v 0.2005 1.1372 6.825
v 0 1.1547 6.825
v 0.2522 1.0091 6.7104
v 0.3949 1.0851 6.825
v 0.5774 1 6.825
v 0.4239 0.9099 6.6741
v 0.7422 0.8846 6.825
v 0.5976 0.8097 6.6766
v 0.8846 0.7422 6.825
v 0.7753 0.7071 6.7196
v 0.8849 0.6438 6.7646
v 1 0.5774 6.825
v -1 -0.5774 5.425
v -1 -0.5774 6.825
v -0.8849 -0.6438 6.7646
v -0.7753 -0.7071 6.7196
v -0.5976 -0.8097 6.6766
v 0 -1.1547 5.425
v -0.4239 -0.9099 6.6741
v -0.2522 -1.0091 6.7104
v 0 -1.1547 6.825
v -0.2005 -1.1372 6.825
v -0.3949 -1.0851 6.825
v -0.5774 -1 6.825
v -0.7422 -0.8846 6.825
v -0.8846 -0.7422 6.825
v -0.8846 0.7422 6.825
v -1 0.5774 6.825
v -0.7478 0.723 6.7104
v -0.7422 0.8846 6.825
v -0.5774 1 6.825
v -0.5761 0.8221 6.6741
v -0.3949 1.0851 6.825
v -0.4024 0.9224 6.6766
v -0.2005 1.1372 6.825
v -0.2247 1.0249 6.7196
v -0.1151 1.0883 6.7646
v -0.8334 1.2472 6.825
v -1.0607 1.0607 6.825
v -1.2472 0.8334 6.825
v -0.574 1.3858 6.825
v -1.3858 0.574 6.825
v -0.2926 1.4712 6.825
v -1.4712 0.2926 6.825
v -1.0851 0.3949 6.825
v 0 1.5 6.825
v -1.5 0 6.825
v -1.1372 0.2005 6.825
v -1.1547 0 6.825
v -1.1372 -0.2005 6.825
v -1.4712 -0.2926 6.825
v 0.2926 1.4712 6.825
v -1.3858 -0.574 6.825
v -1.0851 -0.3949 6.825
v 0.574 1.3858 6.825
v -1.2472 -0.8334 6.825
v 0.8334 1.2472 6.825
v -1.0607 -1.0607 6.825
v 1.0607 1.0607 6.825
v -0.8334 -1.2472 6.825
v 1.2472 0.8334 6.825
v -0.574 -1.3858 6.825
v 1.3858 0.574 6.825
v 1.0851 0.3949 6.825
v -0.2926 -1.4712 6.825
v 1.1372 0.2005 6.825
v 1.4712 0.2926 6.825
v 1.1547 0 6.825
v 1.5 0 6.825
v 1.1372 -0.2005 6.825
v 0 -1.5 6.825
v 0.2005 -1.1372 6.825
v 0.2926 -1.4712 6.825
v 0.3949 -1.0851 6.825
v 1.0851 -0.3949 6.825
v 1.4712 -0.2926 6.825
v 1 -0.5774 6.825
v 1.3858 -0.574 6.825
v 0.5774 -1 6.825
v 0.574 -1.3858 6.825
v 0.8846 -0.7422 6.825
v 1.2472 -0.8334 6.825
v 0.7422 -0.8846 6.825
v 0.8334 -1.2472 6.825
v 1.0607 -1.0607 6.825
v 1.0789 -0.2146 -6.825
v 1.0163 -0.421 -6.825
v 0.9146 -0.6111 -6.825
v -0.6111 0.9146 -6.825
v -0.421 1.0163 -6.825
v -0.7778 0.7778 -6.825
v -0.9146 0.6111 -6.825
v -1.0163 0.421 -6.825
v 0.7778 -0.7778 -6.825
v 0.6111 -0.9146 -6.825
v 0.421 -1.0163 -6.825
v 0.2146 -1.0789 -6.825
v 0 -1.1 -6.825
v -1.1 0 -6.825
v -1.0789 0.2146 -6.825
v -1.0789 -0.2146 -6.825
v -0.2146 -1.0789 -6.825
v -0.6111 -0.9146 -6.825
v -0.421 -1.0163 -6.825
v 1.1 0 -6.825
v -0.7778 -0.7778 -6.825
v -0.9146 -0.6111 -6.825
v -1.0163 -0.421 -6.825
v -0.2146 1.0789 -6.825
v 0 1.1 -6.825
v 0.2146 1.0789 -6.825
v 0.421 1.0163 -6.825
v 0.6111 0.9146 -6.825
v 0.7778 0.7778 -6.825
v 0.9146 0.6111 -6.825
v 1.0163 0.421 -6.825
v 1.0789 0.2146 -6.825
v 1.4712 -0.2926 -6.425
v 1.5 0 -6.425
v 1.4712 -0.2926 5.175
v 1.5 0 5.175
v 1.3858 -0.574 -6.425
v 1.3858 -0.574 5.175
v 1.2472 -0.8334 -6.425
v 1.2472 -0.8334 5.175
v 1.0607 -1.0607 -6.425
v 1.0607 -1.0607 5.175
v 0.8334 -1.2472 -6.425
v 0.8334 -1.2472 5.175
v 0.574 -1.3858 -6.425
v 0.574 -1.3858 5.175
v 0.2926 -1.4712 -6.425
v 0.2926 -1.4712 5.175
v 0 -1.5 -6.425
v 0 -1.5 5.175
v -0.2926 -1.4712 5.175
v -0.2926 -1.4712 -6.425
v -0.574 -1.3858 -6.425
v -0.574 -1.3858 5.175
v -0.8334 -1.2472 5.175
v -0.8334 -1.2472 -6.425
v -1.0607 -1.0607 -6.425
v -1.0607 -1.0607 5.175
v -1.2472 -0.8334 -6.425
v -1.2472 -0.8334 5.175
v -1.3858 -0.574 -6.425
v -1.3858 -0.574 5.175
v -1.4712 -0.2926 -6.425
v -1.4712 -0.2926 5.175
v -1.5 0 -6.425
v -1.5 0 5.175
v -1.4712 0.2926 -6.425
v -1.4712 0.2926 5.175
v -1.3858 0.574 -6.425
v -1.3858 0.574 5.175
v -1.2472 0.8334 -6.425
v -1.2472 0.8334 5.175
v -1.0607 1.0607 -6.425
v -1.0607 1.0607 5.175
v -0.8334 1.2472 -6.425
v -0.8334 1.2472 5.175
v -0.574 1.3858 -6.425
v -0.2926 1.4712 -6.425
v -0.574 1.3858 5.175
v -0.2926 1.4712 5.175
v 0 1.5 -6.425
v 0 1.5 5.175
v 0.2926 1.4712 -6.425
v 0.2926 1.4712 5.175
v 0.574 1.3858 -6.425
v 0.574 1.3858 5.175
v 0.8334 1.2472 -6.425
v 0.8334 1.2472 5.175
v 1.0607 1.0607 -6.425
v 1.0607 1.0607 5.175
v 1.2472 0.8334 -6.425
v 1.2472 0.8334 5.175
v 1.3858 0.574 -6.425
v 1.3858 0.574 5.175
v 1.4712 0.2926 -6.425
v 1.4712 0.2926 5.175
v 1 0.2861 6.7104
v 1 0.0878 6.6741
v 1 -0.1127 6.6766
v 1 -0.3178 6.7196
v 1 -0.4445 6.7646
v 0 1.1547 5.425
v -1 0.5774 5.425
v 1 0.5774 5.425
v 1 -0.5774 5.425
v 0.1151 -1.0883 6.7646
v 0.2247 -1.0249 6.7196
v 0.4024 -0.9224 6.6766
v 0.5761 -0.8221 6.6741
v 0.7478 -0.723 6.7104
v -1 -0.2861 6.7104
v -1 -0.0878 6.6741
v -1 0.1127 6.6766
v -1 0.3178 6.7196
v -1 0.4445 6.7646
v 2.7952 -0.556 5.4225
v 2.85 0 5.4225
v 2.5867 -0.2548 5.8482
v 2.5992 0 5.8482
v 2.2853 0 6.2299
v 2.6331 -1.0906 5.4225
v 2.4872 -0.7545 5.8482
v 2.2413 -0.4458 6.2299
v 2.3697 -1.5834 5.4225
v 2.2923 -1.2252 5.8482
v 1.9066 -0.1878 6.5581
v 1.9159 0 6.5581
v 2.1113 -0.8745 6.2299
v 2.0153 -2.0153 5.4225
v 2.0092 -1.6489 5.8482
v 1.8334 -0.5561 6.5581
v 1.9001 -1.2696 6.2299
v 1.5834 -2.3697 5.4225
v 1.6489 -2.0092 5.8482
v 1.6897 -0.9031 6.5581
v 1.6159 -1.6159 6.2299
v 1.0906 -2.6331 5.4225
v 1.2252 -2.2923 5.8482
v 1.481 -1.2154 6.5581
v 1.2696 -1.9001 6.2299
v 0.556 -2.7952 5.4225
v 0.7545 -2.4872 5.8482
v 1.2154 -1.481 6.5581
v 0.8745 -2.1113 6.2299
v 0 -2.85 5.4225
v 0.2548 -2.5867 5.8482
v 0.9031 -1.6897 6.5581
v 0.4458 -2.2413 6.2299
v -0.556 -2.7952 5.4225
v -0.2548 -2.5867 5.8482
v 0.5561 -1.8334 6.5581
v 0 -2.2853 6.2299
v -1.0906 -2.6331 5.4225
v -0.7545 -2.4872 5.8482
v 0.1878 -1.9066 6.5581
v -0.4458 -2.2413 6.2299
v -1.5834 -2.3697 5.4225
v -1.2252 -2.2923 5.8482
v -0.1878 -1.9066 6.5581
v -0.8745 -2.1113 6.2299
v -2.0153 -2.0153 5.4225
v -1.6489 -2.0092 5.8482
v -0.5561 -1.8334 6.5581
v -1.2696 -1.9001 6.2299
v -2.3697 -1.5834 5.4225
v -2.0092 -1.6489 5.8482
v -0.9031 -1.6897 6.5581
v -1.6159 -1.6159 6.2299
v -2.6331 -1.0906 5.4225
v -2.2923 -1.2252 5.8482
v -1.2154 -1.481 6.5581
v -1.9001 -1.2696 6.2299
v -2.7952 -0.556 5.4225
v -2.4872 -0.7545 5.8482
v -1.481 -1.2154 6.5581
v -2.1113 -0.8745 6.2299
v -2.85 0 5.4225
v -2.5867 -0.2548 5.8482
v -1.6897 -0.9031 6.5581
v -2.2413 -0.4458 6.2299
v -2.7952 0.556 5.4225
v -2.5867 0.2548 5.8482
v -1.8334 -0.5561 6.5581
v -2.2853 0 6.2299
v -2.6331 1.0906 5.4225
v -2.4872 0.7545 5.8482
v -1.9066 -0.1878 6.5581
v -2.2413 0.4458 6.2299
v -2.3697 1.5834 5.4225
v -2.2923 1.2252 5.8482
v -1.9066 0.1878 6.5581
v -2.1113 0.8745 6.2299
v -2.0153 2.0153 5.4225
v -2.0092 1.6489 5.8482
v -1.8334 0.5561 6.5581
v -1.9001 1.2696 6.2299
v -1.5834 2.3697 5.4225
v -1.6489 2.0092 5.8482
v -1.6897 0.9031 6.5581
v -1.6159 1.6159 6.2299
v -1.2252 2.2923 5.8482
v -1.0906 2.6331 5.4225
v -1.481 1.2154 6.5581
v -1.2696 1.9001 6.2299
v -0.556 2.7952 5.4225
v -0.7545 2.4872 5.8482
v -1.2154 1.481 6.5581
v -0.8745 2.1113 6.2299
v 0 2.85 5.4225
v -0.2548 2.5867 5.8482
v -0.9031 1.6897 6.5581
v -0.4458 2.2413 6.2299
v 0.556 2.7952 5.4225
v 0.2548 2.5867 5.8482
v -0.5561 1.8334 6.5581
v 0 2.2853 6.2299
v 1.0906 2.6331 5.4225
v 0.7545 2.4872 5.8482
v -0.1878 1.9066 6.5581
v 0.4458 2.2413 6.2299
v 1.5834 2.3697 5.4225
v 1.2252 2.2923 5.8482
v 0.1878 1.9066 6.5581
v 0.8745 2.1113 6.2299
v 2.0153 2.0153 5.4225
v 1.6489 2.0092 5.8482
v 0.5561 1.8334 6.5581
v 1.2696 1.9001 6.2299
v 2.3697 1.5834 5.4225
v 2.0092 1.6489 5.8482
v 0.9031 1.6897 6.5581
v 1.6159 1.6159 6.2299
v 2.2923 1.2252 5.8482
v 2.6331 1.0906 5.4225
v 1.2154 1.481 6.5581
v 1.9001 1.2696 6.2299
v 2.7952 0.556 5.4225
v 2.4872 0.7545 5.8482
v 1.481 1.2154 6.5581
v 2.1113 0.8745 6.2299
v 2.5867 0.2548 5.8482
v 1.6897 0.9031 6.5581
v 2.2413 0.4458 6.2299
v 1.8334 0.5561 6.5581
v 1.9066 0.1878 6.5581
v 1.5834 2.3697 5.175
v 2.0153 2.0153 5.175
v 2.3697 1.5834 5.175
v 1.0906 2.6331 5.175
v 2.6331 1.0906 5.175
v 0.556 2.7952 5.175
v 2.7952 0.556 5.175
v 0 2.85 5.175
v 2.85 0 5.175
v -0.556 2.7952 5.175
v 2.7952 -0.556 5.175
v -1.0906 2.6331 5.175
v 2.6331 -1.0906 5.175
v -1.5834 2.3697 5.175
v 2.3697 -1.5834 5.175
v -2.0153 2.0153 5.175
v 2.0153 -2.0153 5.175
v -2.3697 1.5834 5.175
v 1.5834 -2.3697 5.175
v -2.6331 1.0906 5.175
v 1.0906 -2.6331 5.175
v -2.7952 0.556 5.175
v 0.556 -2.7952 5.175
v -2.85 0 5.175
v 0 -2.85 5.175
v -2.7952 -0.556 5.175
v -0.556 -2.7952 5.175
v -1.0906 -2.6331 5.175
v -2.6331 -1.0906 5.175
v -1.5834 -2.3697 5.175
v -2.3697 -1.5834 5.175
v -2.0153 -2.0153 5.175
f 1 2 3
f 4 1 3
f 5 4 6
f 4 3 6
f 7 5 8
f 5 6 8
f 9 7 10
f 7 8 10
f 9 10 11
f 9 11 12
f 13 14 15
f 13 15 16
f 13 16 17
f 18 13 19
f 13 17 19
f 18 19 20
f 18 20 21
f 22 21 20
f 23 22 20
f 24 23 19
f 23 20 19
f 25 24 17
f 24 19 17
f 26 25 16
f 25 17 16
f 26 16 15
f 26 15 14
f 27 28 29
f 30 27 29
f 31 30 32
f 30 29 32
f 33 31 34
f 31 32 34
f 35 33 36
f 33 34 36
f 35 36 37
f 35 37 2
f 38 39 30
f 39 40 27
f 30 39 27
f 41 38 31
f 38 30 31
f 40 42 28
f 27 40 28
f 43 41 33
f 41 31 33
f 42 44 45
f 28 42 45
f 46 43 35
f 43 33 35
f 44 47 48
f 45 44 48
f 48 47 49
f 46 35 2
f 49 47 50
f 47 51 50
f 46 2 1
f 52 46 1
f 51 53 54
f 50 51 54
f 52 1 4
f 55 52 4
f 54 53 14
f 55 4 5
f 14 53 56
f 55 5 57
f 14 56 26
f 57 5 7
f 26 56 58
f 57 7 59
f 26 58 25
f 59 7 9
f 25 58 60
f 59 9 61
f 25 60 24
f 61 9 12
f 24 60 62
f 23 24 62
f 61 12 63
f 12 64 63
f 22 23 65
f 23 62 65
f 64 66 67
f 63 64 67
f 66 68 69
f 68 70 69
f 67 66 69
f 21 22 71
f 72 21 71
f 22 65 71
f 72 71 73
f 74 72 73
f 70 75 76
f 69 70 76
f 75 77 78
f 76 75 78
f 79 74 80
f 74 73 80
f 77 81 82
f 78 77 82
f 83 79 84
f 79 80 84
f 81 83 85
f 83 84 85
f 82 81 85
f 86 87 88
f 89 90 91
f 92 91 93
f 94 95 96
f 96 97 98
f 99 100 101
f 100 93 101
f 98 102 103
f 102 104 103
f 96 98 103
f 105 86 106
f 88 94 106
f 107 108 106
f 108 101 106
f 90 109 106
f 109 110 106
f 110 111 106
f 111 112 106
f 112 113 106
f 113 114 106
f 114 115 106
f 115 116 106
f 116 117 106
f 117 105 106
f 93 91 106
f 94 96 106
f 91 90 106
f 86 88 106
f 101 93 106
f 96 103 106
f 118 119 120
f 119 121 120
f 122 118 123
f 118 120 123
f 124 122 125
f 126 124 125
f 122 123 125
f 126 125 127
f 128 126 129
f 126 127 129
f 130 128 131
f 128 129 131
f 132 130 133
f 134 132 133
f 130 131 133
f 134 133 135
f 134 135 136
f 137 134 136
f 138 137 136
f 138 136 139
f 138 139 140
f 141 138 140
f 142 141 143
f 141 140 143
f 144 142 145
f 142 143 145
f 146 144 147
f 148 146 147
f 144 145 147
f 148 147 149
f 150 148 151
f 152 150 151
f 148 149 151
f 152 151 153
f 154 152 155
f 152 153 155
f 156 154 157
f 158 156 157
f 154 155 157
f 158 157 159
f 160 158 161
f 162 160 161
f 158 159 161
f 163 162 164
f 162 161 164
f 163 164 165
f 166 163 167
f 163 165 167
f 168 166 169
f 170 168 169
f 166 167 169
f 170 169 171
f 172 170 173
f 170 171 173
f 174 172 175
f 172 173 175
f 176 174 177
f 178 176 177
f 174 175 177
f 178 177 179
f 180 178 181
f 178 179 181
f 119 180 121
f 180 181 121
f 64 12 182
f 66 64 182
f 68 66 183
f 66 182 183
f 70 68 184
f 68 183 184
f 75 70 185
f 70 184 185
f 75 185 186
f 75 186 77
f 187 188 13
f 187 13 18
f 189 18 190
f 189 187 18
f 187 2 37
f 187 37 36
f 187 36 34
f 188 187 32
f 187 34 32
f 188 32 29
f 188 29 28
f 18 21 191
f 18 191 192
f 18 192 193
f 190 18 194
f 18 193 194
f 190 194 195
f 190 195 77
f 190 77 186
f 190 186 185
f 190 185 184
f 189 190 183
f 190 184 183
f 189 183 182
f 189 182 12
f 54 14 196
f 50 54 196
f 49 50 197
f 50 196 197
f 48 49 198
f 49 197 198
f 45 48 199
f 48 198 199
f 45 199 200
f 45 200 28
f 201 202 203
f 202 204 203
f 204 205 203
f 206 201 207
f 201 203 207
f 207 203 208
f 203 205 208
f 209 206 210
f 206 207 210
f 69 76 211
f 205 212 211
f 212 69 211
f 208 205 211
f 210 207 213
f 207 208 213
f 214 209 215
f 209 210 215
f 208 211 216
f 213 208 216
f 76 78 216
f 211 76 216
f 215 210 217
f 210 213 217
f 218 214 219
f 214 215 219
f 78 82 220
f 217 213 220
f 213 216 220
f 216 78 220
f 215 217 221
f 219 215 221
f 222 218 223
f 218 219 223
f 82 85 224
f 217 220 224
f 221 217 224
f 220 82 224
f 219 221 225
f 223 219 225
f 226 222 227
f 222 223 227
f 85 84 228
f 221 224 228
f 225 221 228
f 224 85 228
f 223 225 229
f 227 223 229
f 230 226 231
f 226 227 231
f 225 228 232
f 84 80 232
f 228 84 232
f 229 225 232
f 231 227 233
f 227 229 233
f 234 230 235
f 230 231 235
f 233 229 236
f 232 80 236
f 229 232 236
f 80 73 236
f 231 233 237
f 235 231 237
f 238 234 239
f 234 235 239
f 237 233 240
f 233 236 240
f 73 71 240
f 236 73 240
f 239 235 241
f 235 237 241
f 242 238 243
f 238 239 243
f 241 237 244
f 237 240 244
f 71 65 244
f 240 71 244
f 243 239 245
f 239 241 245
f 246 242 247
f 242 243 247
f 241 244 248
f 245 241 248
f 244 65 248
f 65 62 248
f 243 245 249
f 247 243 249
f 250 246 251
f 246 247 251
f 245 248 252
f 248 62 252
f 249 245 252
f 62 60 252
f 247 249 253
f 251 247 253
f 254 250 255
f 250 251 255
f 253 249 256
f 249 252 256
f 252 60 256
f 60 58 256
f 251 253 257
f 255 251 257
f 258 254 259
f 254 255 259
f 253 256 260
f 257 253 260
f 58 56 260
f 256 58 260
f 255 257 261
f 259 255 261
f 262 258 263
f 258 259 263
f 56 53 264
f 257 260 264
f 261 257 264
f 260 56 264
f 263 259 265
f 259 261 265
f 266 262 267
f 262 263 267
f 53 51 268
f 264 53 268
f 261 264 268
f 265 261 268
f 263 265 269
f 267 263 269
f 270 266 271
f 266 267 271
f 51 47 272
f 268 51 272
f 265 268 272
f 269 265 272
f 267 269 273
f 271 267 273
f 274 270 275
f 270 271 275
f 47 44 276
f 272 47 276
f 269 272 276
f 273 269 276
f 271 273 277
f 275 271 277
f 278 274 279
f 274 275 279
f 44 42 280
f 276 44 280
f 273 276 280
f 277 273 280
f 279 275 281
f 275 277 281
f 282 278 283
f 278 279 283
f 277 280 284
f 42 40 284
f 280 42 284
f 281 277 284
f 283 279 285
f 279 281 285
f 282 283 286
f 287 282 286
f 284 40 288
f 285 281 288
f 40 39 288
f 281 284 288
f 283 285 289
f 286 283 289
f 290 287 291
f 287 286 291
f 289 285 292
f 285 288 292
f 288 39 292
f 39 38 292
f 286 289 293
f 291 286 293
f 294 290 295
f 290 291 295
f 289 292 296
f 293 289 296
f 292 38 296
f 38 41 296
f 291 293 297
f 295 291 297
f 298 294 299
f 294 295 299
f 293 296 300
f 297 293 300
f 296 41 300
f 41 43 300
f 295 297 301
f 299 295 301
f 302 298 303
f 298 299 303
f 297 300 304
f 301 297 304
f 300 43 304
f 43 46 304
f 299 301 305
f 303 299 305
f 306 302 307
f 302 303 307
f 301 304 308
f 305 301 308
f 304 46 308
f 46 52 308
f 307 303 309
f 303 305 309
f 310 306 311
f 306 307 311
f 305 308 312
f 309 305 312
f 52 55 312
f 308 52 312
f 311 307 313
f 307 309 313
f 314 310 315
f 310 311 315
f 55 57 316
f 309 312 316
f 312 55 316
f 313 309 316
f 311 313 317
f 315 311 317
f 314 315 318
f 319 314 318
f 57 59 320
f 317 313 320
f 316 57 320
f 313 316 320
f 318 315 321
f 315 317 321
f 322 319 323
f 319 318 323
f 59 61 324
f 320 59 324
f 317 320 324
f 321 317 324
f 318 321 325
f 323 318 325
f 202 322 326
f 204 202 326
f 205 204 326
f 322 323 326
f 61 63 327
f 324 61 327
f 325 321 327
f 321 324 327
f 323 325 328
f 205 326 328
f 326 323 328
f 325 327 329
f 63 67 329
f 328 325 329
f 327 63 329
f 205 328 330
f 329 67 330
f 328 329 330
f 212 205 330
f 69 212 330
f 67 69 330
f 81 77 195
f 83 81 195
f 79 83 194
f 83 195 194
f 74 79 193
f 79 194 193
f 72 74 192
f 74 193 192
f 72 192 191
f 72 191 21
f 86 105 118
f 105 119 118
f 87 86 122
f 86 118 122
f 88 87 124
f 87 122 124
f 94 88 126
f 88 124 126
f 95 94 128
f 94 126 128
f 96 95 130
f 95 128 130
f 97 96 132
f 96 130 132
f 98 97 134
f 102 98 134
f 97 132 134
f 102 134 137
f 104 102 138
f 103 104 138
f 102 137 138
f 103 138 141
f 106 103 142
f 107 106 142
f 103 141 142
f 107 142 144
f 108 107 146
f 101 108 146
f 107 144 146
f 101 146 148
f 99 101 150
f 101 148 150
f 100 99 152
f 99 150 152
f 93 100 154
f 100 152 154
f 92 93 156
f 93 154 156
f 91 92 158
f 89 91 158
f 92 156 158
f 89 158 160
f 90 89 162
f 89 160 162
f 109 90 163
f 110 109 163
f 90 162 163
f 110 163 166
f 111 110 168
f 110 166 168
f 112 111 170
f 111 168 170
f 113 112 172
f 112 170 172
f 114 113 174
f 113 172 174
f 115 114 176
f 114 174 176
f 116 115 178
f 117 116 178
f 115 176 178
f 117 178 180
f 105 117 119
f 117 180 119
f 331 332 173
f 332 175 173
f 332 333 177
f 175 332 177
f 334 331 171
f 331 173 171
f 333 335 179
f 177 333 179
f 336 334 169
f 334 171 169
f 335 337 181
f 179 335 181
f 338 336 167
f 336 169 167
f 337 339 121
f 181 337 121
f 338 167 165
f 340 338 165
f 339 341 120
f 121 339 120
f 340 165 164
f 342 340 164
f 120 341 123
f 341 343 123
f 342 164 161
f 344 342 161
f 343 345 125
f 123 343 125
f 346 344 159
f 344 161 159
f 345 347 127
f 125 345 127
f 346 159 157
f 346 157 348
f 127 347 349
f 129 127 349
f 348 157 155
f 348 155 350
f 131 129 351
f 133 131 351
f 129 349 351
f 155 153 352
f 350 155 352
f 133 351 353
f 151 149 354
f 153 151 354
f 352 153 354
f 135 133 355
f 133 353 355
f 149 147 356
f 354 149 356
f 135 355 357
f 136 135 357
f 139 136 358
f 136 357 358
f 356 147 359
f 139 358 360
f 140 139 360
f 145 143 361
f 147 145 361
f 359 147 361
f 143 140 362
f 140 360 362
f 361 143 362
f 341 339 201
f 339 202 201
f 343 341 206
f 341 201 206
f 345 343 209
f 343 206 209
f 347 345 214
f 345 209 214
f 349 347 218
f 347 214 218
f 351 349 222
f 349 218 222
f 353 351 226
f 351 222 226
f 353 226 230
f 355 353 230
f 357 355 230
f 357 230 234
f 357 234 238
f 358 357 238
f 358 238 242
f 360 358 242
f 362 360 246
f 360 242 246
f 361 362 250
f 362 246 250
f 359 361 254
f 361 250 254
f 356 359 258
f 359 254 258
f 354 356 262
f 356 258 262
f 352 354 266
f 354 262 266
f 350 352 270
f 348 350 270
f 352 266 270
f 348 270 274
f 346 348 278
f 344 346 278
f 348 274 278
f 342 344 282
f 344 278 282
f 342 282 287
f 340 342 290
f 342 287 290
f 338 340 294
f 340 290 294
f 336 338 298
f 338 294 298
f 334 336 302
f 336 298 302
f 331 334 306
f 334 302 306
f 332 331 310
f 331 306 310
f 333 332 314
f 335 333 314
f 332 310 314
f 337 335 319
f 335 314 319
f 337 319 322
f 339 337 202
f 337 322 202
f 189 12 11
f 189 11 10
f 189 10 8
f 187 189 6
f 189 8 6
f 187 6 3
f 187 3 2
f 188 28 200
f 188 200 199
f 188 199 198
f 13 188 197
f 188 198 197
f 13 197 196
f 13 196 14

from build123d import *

# Parameters (mm, degrees)
CUT_EXTRUDE1_DEPTH = 1.4


with BuildPart() as part:
    # Sketch2 → Revolve1 (revolve)
    with BuildSketch(Plane(origin=(0, 0, 0), x_dir=(0, 0, -1), z_dir=(1, 0, 0)), mode=Mode.PRIVATE) as revolve1_sk:
        with BuildLine():
            Line((-6.825, 0), (6.825, 0))
            Line((6.825, 0), (6.825, 1.1))
            Line((6.825, 1.1), (6.425, 1.5))
            Line((6.425, 1.5), (-5.175, 1.5))
            Line((-5.175, 1.5), (-5.175, 2.85))
            Line((-5.175, 2.85), (-5.4225, 2.85))
            ThreePointArc((-5.4225, 2.85), (-6.22987489, 2.285251969), (-6.825, 1.5))
            Line((-6.825, 1.5), (-6.825, 0))
        make_face()
    revolve(revolve1_sk.sketch.rotate(Axis((0, 0, 6.825), (0, 0, -1)), 90), axis=Axis((0, 0, 6.825), (0, 0, -1)))

    # Sketch3 → Cut-Extrude1 (cut)
    with BuildSketch(Plane.XY.offset(6.825)):
        Polygon((0, 1.154700538), (-1, 0.577350269), (-1, -0.577350269), (0, -1.154700538), (1, -0.577350269), (1, 0.577350269), align=None)
    extrude(amount=-CUT_EXTRUDE1_DEPTH, mode=Mode.SUBTRACT)

    # Cut-Extrude2 cone 1 section (through the dimple's axis) → Cut-Extrude2 (revolve, cut)
    with BuildSketch(Plane(origin=(0, 0, 6.825), x_dir=(0, -1, 0), z_dir=(1, 0, 0))):
        Polygon((0, 0), (1.154700538, 0), (0, 1.154700538), align=None)
    revolve(axis=Axis((0, 0, 6.825), (0, 0, -1)), mode=Mode.SUBTRACT)


solid = part.part
